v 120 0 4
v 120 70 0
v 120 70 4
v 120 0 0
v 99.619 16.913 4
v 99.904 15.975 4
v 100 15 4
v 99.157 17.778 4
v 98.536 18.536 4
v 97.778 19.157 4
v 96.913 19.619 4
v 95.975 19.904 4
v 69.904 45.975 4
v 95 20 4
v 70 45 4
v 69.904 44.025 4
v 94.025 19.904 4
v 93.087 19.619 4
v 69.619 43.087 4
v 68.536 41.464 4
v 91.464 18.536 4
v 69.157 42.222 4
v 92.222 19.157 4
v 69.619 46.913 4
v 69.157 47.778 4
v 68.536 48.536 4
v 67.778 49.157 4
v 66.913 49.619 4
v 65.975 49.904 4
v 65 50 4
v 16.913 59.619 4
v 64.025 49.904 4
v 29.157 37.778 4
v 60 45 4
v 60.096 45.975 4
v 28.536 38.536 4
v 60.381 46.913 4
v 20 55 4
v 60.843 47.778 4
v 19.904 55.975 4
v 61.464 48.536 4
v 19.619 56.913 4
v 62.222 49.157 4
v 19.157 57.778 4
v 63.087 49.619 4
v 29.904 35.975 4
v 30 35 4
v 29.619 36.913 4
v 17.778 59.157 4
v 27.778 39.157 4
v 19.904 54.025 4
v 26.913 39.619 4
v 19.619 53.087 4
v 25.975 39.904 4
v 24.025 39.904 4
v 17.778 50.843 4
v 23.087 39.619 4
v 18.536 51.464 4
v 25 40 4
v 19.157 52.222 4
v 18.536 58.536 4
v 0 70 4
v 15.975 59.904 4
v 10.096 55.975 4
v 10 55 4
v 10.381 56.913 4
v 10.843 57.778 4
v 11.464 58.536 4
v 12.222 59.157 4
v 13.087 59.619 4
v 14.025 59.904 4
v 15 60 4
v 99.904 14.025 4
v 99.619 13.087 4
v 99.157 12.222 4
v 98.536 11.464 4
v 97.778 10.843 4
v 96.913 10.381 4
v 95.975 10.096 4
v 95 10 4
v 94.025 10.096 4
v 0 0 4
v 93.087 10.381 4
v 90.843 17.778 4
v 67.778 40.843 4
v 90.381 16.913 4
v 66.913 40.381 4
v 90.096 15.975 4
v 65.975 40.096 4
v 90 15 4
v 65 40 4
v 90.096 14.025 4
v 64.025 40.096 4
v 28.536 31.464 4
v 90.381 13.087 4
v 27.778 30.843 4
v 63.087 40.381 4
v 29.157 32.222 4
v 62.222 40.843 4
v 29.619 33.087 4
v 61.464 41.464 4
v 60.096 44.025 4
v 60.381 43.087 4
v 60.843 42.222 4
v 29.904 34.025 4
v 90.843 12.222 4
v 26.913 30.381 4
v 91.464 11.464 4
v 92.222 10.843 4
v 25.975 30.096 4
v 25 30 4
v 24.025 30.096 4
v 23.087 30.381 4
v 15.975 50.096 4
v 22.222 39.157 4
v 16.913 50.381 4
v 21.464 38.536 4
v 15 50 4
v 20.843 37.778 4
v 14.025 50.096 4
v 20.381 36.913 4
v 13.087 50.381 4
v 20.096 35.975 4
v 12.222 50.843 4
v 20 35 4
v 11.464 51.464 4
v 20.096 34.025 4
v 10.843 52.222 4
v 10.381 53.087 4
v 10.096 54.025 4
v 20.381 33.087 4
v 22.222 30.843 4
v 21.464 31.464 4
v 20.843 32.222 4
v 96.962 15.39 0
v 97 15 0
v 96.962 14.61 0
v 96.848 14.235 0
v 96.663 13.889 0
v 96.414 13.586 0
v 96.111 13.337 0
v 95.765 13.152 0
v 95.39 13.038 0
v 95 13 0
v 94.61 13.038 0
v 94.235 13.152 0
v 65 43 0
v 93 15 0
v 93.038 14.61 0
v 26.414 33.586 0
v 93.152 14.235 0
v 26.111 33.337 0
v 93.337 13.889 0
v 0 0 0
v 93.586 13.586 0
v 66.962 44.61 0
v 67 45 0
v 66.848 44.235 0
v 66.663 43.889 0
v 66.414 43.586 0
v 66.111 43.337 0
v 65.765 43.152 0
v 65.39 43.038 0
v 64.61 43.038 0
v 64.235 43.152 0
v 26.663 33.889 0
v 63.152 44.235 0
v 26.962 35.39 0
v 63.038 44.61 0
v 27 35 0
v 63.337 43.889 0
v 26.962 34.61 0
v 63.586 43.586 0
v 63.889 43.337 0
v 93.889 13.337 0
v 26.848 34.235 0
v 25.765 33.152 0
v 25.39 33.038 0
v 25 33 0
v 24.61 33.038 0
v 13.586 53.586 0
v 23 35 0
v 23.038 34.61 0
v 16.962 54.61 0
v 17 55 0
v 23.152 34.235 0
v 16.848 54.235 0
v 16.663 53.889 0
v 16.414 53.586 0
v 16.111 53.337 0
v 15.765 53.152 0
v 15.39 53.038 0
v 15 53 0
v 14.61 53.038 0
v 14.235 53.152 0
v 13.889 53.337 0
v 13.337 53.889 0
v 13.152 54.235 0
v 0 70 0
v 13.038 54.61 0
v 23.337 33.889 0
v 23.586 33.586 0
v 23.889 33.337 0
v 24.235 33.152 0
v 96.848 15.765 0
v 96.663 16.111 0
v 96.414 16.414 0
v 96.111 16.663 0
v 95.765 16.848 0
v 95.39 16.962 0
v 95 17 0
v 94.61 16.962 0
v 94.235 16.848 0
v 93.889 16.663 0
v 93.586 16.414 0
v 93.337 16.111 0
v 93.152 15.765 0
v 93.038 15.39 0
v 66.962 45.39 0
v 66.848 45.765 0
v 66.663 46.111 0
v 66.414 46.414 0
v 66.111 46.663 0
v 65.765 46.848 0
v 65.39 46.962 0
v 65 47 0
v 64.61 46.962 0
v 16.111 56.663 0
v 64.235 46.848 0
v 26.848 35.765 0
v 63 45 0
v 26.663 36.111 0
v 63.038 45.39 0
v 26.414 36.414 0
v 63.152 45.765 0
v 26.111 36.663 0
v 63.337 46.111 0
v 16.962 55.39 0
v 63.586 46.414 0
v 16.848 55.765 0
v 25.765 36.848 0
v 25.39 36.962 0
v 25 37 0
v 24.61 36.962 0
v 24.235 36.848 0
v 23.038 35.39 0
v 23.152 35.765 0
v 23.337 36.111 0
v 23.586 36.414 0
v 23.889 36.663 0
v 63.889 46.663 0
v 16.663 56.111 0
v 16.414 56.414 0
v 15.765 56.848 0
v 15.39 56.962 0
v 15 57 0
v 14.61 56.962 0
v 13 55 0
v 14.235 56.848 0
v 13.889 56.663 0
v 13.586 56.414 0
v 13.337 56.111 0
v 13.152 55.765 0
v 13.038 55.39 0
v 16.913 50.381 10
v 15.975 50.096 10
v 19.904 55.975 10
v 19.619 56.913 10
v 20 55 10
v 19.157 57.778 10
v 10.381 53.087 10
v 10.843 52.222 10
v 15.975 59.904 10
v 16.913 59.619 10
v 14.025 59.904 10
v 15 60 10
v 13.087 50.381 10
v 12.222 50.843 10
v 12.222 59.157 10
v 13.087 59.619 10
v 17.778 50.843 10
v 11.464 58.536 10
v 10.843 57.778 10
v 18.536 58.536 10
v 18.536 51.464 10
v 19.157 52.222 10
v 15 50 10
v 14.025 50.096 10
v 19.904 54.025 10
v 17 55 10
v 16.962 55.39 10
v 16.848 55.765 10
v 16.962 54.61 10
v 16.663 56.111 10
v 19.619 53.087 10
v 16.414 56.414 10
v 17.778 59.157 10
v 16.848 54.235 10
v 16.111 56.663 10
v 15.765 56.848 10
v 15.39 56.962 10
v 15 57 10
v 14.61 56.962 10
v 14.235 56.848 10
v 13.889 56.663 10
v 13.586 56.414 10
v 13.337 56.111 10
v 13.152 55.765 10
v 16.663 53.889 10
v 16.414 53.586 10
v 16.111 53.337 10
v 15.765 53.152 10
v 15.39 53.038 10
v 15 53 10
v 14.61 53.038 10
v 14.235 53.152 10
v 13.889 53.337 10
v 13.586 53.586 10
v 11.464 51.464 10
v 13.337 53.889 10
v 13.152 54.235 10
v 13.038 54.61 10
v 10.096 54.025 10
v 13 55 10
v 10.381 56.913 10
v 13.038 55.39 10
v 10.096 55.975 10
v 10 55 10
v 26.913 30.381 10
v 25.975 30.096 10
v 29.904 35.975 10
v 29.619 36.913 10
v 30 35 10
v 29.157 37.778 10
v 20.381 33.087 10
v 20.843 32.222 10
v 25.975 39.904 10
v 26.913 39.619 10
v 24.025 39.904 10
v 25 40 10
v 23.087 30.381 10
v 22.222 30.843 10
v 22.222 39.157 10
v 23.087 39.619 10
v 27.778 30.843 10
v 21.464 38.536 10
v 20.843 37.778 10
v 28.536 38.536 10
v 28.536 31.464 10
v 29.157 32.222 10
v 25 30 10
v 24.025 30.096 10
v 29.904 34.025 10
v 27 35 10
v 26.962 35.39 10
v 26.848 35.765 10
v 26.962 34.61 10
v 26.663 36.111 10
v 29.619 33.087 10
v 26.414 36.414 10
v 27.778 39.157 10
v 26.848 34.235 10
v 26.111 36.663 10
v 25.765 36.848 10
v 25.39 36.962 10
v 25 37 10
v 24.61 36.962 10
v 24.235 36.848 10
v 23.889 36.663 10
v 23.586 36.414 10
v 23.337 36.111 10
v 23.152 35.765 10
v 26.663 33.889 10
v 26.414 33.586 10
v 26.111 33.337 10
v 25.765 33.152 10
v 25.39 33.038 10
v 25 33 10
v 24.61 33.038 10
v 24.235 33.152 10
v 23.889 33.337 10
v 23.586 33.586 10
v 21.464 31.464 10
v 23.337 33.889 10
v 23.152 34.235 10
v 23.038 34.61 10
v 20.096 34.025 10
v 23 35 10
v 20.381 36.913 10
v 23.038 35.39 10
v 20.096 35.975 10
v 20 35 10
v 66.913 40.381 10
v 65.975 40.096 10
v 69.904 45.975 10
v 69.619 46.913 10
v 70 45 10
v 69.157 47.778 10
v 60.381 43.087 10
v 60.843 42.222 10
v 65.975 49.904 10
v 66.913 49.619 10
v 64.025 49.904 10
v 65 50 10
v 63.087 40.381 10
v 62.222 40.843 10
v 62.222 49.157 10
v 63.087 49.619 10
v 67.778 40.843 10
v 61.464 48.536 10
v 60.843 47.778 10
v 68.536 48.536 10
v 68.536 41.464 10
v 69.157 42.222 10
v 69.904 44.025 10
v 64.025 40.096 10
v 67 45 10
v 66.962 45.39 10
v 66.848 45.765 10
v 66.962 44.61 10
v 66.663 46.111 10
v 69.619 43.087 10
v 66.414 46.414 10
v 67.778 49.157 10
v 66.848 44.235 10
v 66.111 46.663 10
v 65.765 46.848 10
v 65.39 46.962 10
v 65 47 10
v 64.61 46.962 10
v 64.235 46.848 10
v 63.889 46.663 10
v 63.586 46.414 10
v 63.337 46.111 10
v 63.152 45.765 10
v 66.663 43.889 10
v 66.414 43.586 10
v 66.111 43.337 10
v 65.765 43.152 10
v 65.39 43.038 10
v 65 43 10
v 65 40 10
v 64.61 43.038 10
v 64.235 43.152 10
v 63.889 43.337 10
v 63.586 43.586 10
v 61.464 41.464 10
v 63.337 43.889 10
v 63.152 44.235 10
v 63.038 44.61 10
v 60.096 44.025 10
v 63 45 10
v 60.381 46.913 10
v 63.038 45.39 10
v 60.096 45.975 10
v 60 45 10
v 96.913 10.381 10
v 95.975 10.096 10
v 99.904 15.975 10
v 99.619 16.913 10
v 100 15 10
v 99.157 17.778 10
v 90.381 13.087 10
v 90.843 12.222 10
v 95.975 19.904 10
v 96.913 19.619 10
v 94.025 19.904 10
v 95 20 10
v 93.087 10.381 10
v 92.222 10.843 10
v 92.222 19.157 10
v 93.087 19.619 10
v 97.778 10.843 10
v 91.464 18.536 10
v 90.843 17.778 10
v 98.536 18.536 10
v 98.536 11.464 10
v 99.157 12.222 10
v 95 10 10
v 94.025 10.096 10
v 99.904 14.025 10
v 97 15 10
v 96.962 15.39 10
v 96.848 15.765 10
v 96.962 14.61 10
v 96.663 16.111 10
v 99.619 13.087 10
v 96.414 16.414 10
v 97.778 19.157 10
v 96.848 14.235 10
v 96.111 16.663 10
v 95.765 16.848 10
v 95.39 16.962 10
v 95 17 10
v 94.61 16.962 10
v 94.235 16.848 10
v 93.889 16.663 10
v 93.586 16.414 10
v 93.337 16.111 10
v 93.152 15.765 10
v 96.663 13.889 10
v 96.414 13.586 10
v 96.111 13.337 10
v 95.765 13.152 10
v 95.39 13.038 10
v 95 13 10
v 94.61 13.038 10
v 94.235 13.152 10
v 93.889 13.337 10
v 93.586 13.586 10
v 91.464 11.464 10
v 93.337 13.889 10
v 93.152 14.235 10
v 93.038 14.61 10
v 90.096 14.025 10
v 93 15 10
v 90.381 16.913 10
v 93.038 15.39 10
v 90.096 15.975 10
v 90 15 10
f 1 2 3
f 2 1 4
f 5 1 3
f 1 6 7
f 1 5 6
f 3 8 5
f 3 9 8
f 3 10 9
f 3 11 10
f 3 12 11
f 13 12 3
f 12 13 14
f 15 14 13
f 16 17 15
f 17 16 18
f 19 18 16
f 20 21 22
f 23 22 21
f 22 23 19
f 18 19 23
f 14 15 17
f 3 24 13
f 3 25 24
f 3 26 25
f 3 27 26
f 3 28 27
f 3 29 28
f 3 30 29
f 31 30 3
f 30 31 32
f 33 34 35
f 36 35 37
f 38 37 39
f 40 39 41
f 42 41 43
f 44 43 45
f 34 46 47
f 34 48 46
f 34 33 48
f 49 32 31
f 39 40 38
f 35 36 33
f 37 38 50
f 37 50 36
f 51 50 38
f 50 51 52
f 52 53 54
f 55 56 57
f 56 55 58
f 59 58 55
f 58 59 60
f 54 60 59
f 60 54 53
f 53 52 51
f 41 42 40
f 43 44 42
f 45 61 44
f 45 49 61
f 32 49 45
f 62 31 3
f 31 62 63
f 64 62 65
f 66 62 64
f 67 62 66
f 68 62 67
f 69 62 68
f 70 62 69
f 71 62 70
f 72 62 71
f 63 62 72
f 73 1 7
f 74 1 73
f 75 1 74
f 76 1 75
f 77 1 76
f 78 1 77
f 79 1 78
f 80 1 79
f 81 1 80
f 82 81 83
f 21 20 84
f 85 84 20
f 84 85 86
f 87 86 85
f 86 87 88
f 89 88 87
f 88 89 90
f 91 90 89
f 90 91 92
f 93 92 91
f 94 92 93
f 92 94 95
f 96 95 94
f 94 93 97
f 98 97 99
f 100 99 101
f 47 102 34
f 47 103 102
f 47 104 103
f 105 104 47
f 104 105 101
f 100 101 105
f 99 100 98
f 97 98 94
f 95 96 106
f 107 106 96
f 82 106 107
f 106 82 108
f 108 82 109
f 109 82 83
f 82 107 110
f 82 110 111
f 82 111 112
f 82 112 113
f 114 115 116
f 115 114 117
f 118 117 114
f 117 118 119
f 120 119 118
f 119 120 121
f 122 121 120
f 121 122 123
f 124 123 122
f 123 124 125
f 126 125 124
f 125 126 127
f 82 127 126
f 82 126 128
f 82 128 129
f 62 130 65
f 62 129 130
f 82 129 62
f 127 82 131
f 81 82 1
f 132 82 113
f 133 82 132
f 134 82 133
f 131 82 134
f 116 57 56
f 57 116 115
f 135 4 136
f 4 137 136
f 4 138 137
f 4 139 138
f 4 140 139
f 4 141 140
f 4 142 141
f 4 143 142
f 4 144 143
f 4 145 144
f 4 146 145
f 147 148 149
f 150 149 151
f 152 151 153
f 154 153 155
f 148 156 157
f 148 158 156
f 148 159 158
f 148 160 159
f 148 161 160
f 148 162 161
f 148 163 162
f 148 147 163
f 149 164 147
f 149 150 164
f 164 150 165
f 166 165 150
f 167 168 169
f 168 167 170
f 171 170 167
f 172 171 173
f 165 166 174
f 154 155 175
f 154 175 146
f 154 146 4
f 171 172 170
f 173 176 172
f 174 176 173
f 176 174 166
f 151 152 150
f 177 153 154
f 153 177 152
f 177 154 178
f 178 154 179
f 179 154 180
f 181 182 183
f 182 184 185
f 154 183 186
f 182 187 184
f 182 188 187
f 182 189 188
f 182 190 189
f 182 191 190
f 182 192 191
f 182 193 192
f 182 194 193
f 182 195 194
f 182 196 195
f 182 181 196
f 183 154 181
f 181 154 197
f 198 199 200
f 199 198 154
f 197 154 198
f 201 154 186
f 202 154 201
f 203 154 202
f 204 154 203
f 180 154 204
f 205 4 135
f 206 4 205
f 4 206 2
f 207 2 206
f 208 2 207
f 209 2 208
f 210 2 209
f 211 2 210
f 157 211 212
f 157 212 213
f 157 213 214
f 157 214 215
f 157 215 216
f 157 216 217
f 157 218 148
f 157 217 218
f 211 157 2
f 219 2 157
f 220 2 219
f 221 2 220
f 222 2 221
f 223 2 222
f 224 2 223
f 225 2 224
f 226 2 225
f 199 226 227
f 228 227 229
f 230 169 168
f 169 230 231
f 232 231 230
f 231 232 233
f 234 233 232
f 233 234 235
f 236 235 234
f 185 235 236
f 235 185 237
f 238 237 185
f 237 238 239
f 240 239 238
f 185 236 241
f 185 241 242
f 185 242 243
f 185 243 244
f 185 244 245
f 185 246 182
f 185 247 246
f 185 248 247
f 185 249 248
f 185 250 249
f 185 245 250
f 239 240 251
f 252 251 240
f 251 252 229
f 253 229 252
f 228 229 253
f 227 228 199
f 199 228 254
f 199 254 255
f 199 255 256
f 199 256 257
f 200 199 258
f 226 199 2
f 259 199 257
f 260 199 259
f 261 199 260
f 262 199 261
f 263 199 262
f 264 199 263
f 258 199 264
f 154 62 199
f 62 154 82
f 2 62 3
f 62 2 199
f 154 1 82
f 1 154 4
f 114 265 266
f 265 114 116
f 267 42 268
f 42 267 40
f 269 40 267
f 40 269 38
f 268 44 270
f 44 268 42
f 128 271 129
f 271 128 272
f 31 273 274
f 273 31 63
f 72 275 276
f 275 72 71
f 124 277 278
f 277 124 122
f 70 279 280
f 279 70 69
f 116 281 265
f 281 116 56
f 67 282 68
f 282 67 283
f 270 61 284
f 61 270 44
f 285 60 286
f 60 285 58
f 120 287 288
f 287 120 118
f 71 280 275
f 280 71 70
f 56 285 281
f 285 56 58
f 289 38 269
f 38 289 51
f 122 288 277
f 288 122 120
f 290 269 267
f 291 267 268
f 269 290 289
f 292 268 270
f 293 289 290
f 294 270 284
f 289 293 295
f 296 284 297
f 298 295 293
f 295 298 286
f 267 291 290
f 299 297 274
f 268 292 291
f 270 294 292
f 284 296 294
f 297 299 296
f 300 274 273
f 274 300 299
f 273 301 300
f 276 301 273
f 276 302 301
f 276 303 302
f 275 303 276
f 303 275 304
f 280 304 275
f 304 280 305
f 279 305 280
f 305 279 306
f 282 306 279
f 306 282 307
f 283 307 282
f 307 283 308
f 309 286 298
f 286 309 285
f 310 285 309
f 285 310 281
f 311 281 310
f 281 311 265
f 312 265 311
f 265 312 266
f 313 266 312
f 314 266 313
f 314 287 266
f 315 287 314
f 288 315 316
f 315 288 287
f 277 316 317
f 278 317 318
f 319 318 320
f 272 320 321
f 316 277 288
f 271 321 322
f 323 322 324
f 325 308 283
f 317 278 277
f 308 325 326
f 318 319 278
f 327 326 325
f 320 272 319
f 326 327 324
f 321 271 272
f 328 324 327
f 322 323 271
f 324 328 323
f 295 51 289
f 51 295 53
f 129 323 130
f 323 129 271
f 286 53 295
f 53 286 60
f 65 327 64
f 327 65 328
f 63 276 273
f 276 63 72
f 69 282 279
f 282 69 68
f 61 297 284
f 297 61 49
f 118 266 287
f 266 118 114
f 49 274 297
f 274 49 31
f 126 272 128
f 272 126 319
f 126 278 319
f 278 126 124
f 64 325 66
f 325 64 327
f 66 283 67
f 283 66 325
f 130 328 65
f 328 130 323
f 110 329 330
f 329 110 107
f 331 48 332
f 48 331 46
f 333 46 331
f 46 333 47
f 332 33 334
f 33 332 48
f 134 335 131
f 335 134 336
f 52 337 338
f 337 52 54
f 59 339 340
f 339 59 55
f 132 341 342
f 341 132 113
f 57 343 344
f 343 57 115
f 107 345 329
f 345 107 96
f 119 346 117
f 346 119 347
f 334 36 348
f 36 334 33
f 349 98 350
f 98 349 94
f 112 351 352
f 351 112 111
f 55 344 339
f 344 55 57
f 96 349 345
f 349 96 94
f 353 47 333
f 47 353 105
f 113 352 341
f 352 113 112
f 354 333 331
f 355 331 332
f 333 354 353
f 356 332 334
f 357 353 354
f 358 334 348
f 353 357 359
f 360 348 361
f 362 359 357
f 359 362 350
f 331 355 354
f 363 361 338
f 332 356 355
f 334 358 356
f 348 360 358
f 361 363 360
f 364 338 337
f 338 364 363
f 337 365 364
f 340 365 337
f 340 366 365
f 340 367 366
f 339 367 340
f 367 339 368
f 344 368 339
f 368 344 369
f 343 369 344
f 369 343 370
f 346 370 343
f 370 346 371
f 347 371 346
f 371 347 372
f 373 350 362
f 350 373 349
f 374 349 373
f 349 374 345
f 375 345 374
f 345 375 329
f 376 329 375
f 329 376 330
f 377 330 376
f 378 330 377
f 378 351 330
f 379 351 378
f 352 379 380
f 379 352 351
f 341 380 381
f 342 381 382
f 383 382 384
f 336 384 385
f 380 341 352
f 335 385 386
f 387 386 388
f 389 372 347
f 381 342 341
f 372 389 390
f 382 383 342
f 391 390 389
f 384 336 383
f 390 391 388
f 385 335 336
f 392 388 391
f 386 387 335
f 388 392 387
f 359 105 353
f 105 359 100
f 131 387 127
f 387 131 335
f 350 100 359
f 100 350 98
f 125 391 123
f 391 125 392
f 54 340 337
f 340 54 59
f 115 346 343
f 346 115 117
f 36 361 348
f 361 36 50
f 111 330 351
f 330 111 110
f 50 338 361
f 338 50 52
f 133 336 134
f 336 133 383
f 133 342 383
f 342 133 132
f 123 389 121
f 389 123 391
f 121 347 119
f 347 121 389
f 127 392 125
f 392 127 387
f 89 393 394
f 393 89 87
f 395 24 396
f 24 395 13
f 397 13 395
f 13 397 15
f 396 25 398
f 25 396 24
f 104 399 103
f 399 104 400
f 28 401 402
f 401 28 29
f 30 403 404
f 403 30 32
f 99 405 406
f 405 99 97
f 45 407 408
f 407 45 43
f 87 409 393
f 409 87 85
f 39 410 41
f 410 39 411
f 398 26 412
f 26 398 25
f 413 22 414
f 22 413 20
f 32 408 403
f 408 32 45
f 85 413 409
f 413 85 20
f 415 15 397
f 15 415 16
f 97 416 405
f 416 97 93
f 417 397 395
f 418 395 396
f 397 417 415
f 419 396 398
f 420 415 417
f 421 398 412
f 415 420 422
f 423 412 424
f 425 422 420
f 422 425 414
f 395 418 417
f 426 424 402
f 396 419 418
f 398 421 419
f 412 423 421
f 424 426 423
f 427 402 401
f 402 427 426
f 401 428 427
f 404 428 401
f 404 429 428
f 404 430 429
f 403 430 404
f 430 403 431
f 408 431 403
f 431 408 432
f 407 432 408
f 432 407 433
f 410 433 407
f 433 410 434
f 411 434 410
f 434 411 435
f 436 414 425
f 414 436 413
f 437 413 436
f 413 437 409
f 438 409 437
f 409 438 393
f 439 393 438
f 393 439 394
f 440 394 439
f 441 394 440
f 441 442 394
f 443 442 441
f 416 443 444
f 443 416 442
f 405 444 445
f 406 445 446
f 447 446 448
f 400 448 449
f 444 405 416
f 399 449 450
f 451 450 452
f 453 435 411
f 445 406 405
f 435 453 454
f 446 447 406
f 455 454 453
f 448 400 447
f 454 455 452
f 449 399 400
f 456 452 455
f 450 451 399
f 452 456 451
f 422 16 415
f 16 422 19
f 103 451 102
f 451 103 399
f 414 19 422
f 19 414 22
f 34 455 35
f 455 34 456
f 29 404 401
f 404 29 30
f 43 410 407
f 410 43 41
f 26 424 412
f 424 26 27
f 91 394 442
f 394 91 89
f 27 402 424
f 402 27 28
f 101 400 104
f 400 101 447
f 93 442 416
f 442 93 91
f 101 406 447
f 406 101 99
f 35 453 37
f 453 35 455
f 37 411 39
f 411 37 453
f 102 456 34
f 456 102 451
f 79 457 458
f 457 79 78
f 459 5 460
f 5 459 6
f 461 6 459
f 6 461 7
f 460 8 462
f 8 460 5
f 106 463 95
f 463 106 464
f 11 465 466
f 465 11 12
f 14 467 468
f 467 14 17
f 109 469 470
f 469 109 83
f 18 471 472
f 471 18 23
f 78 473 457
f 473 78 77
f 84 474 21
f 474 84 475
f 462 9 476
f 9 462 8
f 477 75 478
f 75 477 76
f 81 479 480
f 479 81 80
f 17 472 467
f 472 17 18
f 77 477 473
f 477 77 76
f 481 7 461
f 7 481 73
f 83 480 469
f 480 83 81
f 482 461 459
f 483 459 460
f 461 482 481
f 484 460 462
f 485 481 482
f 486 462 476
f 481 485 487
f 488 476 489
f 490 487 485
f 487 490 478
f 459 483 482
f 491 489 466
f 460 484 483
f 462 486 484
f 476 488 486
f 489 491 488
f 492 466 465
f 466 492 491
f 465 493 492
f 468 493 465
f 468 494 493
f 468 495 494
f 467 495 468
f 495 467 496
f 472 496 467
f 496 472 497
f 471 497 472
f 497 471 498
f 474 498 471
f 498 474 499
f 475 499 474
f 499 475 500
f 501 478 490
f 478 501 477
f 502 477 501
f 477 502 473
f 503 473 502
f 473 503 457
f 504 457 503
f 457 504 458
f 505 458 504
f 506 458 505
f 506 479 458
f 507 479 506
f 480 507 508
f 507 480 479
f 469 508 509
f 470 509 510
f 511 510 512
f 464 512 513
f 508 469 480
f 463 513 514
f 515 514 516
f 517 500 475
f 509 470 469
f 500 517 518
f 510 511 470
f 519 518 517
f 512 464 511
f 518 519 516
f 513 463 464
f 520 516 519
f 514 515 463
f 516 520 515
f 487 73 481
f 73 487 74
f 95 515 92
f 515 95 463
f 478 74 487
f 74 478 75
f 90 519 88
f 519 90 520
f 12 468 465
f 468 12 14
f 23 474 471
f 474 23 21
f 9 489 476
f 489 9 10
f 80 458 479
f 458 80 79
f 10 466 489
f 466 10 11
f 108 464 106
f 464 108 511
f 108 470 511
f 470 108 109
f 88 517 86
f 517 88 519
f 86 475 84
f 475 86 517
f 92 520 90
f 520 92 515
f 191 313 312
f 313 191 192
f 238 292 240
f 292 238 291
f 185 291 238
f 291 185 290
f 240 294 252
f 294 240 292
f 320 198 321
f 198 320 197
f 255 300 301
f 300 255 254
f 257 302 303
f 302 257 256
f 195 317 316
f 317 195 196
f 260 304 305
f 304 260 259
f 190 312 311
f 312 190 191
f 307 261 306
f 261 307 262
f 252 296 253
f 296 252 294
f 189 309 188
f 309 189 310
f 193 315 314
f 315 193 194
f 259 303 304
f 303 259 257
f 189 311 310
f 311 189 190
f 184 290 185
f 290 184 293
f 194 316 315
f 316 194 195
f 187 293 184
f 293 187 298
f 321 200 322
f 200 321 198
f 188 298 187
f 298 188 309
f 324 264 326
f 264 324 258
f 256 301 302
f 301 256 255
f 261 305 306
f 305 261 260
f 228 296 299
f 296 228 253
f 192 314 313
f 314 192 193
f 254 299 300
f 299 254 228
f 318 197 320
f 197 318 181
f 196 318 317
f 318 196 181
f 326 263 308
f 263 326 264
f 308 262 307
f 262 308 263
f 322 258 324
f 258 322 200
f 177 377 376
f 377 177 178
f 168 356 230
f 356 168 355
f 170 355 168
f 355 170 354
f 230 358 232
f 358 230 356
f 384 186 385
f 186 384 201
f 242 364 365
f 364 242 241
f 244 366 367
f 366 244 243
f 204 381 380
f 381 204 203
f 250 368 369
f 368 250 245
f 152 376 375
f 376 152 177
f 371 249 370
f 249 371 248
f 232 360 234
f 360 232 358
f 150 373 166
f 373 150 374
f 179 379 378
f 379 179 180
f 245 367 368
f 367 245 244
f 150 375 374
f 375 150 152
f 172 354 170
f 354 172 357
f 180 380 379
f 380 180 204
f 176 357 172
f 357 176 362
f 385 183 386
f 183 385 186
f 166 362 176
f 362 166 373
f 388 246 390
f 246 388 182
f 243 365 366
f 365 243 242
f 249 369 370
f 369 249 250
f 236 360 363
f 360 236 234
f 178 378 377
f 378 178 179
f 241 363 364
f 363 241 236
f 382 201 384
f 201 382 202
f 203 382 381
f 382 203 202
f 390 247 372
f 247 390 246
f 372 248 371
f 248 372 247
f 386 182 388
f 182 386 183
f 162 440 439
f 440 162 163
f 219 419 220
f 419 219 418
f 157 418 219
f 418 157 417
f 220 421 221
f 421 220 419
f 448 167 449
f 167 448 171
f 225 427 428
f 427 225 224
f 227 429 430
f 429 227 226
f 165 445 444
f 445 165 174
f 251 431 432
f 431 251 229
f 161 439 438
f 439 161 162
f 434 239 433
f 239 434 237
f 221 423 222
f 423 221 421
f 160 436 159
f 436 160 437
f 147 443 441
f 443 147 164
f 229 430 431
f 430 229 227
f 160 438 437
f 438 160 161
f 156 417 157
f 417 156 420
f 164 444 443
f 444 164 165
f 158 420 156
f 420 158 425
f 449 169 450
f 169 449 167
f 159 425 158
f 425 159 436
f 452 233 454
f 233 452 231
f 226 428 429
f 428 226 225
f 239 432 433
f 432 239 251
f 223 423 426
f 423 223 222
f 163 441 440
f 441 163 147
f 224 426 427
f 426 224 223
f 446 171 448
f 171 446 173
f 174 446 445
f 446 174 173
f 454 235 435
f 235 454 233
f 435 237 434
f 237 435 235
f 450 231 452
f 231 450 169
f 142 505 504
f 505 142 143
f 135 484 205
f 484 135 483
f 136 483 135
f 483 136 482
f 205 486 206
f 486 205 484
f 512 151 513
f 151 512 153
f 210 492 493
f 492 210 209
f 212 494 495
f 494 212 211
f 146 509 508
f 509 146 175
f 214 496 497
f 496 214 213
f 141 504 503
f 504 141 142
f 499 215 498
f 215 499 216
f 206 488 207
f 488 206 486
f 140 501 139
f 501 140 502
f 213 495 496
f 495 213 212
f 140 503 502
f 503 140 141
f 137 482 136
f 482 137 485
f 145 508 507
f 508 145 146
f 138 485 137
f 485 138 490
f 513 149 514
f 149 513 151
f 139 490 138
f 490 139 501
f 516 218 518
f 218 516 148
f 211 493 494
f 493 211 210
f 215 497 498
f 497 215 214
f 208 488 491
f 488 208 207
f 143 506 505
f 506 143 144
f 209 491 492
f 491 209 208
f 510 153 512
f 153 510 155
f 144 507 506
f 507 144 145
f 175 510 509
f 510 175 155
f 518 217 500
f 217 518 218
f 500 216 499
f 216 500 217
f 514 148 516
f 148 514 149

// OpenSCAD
$fn = 32;

// ----------------------------------------------------------------------
// Boss field: plate with bosses at given coordinates
// ----------------------------------------------------------------------

// --- parameters (mm) ---
plate_l = 120;            // plate length, X
plate_w = 70;             // plate width, Y
plate_t = 4;              // plate thickness, Z
boss_d = 10;              // boss diameter
boss_h = 6;               // boss height above the plate
bore_d = 4;               // boss bore

total_h = plate_t + boss_h;  // overall height

difference() {
  union() {
    cube([plate_l, plate_w, plate_t]);
    translate([15, 55, plate_t]) cylinder(h = boss_h, d = boss_d);
    translate([25, 35, plate_t]) cylinder(h = boss_h, d = boss_d);
    translate([65, 45, plate_t]) cylinder(h = boss_h, d = boss_d);
    translate([95, 15, plate_t]) cylinder(h = boss_h, d = boss_d);
  }
  translate([15, 55, -1]) cylinder(h = total_h + 2, d = bore_d);
  translate([25, 35, -1]) cylinder(h = total_h + 2, d = bore_d);
  translate([65, 45, -1]) cylinder(h = total_h + 2, d = bore_d);
  translate([95, 15, -1]) cylinder(h = total_h + 2, d = bore_d);
}
